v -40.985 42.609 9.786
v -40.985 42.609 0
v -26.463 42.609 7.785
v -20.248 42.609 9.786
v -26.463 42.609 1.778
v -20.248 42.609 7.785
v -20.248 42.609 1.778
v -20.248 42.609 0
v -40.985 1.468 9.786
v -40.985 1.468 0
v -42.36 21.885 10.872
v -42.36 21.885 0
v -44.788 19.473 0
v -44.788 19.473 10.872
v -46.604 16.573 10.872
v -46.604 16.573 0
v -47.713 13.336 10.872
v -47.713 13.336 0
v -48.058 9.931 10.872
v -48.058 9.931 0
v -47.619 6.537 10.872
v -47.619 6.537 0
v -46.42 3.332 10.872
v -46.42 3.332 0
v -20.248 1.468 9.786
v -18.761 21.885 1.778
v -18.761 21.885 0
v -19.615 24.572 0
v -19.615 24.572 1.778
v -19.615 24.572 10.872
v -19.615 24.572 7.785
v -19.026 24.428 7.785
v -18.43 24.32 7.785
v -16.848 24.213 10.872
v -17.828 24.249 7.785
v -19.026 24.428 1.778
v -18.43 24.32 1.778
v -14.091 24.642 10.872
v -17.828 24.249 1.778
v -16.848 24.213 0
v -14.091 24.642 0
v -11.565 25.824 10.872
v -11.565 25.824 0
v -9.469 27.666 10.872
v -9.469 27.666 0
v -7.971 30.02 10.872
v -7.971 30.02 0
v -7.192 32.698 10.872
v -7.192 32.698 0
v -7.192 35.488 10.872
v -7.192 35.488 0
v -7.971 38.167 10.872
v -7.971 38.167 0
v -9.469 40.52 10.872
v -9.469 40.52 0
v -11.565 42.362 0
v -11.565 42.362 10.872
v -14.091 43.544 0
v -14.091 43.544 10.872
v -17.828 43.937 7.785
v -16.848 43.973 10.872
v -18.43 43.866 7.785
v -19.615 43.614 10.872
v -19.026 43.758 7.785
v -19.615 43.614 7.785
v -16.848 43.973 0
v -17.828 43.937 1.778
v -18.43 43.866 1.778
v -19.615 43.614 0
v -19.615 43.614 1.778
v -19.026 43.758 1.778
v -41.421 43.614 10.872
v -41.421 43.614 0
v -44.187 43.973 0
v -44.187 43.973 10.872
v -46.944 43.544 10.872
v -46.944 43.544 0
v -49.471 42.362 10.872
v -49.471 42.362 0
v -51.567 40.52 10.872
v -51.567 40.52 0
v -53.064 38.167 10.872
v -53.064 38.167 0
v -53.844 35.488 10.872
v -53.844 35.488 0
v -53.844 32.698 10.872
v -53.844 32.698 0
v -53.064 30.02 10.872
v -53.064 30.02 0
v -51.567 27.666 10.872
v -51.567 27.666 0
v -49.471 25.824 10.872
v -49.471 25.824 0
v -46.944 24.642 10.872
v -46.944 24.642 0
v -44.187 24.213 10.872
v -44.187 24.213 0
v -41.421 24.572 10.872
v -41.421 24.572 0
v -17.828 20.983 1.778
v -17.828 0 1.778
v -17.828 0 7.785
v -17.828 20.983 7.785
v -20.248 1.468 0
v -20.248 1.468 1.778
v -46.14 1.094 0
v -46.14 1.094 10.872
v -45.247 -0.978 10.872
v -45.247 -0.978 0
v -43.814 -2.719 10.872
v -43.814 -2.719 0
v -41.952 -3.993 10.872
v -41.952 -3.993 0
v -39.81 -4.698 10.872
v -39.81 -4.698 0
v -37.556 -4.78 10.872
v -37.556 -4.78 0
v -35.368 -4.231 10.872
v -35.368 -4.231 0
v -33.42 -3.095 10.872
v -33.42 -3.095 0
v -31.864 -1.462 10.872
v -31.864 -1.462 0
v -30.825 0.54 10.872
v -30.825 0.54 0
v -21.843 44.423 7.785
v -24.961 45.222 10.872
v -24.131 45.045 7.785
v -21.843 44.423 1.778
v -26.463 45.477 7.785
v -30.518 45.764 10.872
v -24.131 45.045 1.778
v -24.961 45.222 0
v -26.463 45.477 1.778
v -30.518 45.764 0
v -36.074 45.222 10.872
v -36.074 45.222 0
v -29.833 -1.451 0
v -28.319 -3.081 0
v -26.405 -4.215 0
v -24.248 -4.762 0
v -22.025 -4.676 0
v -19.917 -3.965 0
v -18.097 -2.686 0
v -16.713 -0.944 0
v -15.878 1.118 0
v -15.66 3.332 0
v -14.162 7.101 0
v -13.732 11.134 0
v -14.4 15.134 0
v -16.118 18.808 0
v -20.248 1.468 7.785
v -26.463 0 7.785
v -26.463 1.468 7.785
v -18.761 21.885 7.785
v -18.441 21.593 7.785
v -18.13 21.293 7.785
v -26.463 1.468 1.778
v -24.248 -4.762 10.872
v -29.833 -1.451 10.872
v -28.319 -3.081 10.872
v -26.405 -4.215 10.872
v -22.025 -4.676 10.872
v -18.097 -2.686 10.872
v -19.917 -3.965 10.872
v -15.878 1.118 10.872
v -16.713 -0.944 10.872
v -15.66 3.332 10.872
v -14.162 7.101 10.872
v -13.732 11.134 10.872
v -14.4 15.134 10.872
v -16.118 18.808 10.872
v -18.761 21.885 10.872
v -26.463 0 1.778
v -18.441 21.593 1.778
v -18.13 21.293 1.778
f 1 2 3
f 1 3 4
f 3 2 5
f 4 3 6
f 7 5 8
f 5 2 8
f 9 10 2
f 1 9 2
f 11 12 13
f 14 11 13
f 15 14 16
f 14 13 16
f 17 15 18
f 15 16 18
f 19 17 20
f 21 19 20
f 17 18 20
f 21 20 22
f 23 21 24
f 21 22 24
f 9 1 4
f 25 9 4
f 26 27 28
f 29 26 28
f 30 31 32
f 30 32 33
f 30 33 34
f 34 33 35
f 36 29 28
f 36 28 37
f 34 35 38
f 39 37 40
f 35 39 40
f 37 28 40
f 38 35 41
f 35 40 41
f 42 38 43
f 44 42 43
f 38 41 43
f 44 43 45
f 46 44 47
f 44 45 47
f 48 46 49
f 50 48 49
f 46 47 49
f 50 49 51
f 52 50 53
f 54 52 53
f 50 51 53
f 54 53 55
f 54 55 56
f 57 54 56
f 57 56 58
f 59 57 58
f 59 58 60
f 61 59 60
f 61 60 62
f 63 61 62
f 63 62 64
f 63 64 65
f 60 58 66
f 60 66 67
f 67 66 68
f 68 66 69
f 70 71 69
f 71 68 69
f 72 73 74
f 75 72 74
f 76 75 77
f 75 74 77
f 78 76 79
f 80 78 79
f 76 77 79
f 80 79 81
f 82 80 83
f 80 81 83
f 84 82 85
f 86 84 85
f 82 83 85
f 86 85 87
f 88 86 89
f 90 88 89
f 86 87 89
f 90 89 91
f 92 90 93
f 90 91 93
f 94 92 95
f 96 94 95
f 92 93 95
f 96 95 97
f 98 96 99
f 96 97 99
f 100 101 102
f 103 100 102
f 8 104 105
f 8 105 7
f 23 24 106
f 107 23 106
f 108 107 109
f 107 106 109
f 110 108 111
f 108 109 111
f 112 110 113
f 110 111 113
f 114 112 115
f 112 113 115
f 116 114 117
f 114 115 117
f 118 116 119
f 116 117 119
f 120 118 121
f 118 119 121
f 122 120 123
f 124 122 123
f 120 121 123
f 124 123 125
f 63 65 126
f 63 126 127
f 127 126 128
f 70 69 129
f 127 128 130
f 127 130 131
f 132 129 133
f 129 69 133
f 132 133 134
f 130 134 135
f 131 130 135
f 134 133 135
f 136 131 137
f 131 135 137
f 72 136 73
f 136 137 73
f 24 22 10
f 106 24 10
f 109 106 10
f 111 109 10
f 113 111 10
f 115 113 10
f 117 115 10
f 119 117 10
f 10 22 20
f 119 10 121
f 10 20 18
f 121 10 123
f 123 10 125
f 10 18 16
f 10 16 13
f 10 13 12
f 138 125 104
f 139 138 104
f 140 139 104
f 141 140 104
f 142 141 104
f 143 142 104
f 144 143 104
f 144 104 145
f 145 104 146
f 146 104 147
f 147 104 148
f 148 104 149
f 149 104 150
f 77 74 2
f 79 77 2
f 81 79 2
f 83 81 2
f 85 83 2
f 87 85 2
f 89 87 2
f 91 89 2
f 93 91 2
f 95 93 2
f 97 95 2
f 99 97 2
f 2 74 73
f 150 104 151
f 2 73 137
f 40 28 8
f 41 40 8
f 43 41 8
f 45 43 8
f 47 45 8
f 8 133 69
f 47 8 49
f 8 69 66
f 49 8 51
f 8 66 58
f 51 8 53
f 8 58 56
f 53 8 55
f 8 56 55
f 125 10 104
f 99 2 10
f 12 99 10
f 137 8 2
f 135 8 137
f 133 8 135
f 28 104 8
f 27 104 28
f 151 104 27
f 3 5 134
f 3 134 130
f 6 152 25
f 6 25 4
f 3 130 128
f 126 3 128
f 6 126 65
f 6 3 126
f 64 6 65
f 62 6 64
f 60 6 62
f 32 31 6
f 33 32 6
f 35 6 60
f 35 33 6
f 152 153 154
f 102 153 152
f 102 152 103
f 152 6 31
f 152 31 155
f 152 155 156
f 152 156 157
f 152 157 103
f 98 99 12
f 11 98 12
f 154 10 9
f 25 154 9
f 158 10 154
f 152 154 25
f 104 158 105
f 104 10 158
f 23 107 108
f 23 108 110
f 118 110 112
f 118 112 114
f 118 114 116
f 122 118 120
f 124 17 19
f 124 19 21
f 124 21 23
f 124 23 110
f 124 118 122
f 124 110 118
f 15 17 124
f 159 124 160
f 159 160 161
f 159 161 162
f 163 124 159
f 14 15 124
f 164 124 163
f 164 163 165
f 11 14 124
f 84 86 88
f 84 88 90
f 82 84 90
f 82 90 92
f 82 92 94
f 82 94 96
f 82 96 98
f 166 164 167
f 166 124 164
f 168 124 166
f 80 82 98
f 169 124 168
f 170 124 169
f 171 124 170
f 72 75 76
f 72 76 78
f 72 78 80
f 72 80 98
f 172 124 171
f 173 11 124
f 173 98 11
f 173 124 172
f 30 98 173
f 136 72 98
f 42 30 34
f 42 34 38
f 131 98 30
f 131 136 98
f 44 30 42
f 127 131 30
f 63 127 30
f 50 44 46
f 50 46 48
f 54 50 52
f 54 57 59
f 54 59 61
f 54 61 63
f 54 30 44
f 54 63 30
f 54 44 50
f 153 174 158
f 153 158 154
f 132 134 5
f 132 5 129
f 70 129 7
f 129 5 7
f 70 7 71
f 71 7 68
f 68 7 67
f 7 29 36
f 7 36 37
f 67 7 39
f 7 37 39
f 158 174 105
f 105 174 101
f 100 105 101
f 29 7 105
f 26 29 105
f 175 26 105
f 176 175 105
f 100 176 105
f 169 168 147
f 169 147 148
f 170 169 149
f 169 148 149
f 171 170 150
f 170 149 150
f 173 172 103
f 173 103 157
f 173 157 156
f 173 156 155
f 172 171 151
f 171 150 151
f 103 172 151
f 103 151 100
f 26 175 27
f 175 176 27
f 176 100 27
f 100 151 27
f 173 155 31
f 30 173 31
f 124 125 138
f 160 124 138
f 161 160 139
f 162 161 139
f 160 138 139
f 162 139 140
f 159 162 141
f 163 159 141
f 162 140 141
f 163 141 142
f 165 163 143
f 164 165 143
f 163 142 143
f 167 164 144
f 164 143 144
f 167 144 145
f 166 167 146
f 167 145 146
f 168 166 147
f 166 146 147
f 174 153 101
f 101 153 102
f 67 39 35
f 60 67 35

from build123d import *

# Parameters (mm, degrees)
F1_DEPTH = 10.87167
F2_W     = 20.7378324121
F2_H     = 41.1411811365
F3_DEPTH = 9.78587
F4_W     = 8.6351763457
F4_H     = 6.0070783366
F5_DEPTH = 63.13654


with BuildPart() as f1:
    # F0 (on Top) → F1 (new body)
    with BuildSketch(Plane.XY):
        with BuildLine():
            ThreePointArc((-19.6146064737, 24.572059019), (-7.0926943283, 34.0930740127), (-19.6146064737, 43.6140890064))
            ThreePointArc((-19.6146064737, 43.6140890064), (-30.5177033911, 45.7644046028), (-41.4208003086, 43.6140890064))
            ThreePointArc((-41.4208003086, 43.6140890064), (-53.942712454, 34.0930740127), (-41.4208003086, 24.572059019))
            Line((-41.4208003086, 24.572059019), (-42.3597145092, 21.8851334871))
            ThreePointArc((-42.3597145092, 21.8851334871), (-47.713167553, 13.3357192606), (-46.4203947683, 3.3316859921))
            ThreePointArc((-46.4203947683, 3.3316859921), (-39.8100362087, -4.6984516114), (-30.8246676488, 0.5401648148))
            ThreePointArc((-30.8246676488, 0.5401648148), (-22.0252975249, -4.6761652077), (-15.660289069, 3.3316859921))
            ThreePointArc((-15.660289069, 3.3316859921), (-13.9296875224, 13.1566111484), (-18.7605294597, 21.8851334871))
            Line((-18.7605294597, 21.8851334871), (-19.6146064737, 24.572059019))
        make_face()
        with BuildLine():
            ThreePointArc((-30.7483132929, 5.6346026249), (-30.371478369, 3.0811636063), (-30.8246676488, 0.5401648148))
            ThreePointArc((-30.8246676488, 0.5401648148), (-31.2152322971, 3.0938096117), (-30.7483132929, 5.6346026249))
        make_face(mode=Mode.SUBTRACT)
        with BuildLine():
            ThreePointArc((-30.7483132929, 5.6346026249), (-31.2152322971, 3.0938096117), (-30.8246676488, 0.5401648148))
            ThreePointArc((-30.8246676488, 0.5401648148), (-30.371478369, 3.0811636063), (-30.7483132929, 5.6346026249))
        make_face()
    extrude(amount=F1_DEPTH)

    # F2 (on Top) → F3 (cut)
    with BuildSketch(Plane.XY):
        with Locations((-30.6165078655, 22.0384193235)):
            Rectangle(F2_W, F2_H)
    extrude(amount=F3_DEPTH, mode=Mode.SUBTRACT)

    # F4 (on Front) → F5 (cut)
    with BuildSketch(Plane.XZ):
        with Locations((-22.1452759579, 4.781266558)):
            Rectangle(F4_W, F4_H)
    extrude(amount=-F5_DEPTH, mode=Mode.SUBTRACT)


solid = f1.part
